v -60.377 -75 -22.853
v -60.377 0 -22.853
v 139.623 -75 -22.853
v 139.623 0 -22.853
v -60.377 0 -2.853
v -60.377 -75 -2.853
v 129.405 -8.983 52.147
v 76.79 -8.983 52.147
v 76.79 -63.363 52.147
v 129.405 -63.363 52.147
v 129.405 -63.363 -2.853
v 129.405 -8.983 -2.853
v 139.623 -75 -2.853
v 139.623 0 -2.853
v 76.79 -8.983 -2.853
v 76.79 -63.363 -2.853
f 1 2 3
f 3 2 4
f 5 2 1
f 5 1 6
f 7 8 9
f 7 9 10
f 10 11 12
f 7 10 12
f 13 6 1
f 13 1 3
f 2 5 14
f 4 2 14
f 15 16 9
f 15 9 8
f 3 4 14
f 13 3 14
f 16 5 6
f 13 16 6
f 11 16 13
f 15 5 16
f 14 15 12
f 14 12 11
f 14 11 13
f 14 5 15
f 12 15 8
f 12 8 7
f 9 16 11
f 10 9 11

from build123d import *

# Parameters (mm, degrees)
F0_W     = 200
F0_H     = 20
F1_DEPTH = 75
F2_W     = 52.6148378849
F2_H     = 54.3804401532
F3_DEPTH = 55


# Not quite as in the source:
# - a feature names something its author has since deleted; it is built from what else it names


with BuildPart() as f1:
    # F0 (on Front) → F1 (new body)
    with BuildSketch(Plane.XZ):
        with Locations((39.6226420999, -12.8532575865)):
            Rectangle(F0_W, F0_H)
    extrude(amount=F1_DEPTH)

    # F2 (on face) → F3 (join)
    with BuildSketch(Plane.XY.offset(-2.8532575865)):
        with Locations((103.0974239111, -36.1731755547)):
            Rectangle(F2_W, F2_H)
    extrude(amount=F3_DEPTH)


solid = f1.part
